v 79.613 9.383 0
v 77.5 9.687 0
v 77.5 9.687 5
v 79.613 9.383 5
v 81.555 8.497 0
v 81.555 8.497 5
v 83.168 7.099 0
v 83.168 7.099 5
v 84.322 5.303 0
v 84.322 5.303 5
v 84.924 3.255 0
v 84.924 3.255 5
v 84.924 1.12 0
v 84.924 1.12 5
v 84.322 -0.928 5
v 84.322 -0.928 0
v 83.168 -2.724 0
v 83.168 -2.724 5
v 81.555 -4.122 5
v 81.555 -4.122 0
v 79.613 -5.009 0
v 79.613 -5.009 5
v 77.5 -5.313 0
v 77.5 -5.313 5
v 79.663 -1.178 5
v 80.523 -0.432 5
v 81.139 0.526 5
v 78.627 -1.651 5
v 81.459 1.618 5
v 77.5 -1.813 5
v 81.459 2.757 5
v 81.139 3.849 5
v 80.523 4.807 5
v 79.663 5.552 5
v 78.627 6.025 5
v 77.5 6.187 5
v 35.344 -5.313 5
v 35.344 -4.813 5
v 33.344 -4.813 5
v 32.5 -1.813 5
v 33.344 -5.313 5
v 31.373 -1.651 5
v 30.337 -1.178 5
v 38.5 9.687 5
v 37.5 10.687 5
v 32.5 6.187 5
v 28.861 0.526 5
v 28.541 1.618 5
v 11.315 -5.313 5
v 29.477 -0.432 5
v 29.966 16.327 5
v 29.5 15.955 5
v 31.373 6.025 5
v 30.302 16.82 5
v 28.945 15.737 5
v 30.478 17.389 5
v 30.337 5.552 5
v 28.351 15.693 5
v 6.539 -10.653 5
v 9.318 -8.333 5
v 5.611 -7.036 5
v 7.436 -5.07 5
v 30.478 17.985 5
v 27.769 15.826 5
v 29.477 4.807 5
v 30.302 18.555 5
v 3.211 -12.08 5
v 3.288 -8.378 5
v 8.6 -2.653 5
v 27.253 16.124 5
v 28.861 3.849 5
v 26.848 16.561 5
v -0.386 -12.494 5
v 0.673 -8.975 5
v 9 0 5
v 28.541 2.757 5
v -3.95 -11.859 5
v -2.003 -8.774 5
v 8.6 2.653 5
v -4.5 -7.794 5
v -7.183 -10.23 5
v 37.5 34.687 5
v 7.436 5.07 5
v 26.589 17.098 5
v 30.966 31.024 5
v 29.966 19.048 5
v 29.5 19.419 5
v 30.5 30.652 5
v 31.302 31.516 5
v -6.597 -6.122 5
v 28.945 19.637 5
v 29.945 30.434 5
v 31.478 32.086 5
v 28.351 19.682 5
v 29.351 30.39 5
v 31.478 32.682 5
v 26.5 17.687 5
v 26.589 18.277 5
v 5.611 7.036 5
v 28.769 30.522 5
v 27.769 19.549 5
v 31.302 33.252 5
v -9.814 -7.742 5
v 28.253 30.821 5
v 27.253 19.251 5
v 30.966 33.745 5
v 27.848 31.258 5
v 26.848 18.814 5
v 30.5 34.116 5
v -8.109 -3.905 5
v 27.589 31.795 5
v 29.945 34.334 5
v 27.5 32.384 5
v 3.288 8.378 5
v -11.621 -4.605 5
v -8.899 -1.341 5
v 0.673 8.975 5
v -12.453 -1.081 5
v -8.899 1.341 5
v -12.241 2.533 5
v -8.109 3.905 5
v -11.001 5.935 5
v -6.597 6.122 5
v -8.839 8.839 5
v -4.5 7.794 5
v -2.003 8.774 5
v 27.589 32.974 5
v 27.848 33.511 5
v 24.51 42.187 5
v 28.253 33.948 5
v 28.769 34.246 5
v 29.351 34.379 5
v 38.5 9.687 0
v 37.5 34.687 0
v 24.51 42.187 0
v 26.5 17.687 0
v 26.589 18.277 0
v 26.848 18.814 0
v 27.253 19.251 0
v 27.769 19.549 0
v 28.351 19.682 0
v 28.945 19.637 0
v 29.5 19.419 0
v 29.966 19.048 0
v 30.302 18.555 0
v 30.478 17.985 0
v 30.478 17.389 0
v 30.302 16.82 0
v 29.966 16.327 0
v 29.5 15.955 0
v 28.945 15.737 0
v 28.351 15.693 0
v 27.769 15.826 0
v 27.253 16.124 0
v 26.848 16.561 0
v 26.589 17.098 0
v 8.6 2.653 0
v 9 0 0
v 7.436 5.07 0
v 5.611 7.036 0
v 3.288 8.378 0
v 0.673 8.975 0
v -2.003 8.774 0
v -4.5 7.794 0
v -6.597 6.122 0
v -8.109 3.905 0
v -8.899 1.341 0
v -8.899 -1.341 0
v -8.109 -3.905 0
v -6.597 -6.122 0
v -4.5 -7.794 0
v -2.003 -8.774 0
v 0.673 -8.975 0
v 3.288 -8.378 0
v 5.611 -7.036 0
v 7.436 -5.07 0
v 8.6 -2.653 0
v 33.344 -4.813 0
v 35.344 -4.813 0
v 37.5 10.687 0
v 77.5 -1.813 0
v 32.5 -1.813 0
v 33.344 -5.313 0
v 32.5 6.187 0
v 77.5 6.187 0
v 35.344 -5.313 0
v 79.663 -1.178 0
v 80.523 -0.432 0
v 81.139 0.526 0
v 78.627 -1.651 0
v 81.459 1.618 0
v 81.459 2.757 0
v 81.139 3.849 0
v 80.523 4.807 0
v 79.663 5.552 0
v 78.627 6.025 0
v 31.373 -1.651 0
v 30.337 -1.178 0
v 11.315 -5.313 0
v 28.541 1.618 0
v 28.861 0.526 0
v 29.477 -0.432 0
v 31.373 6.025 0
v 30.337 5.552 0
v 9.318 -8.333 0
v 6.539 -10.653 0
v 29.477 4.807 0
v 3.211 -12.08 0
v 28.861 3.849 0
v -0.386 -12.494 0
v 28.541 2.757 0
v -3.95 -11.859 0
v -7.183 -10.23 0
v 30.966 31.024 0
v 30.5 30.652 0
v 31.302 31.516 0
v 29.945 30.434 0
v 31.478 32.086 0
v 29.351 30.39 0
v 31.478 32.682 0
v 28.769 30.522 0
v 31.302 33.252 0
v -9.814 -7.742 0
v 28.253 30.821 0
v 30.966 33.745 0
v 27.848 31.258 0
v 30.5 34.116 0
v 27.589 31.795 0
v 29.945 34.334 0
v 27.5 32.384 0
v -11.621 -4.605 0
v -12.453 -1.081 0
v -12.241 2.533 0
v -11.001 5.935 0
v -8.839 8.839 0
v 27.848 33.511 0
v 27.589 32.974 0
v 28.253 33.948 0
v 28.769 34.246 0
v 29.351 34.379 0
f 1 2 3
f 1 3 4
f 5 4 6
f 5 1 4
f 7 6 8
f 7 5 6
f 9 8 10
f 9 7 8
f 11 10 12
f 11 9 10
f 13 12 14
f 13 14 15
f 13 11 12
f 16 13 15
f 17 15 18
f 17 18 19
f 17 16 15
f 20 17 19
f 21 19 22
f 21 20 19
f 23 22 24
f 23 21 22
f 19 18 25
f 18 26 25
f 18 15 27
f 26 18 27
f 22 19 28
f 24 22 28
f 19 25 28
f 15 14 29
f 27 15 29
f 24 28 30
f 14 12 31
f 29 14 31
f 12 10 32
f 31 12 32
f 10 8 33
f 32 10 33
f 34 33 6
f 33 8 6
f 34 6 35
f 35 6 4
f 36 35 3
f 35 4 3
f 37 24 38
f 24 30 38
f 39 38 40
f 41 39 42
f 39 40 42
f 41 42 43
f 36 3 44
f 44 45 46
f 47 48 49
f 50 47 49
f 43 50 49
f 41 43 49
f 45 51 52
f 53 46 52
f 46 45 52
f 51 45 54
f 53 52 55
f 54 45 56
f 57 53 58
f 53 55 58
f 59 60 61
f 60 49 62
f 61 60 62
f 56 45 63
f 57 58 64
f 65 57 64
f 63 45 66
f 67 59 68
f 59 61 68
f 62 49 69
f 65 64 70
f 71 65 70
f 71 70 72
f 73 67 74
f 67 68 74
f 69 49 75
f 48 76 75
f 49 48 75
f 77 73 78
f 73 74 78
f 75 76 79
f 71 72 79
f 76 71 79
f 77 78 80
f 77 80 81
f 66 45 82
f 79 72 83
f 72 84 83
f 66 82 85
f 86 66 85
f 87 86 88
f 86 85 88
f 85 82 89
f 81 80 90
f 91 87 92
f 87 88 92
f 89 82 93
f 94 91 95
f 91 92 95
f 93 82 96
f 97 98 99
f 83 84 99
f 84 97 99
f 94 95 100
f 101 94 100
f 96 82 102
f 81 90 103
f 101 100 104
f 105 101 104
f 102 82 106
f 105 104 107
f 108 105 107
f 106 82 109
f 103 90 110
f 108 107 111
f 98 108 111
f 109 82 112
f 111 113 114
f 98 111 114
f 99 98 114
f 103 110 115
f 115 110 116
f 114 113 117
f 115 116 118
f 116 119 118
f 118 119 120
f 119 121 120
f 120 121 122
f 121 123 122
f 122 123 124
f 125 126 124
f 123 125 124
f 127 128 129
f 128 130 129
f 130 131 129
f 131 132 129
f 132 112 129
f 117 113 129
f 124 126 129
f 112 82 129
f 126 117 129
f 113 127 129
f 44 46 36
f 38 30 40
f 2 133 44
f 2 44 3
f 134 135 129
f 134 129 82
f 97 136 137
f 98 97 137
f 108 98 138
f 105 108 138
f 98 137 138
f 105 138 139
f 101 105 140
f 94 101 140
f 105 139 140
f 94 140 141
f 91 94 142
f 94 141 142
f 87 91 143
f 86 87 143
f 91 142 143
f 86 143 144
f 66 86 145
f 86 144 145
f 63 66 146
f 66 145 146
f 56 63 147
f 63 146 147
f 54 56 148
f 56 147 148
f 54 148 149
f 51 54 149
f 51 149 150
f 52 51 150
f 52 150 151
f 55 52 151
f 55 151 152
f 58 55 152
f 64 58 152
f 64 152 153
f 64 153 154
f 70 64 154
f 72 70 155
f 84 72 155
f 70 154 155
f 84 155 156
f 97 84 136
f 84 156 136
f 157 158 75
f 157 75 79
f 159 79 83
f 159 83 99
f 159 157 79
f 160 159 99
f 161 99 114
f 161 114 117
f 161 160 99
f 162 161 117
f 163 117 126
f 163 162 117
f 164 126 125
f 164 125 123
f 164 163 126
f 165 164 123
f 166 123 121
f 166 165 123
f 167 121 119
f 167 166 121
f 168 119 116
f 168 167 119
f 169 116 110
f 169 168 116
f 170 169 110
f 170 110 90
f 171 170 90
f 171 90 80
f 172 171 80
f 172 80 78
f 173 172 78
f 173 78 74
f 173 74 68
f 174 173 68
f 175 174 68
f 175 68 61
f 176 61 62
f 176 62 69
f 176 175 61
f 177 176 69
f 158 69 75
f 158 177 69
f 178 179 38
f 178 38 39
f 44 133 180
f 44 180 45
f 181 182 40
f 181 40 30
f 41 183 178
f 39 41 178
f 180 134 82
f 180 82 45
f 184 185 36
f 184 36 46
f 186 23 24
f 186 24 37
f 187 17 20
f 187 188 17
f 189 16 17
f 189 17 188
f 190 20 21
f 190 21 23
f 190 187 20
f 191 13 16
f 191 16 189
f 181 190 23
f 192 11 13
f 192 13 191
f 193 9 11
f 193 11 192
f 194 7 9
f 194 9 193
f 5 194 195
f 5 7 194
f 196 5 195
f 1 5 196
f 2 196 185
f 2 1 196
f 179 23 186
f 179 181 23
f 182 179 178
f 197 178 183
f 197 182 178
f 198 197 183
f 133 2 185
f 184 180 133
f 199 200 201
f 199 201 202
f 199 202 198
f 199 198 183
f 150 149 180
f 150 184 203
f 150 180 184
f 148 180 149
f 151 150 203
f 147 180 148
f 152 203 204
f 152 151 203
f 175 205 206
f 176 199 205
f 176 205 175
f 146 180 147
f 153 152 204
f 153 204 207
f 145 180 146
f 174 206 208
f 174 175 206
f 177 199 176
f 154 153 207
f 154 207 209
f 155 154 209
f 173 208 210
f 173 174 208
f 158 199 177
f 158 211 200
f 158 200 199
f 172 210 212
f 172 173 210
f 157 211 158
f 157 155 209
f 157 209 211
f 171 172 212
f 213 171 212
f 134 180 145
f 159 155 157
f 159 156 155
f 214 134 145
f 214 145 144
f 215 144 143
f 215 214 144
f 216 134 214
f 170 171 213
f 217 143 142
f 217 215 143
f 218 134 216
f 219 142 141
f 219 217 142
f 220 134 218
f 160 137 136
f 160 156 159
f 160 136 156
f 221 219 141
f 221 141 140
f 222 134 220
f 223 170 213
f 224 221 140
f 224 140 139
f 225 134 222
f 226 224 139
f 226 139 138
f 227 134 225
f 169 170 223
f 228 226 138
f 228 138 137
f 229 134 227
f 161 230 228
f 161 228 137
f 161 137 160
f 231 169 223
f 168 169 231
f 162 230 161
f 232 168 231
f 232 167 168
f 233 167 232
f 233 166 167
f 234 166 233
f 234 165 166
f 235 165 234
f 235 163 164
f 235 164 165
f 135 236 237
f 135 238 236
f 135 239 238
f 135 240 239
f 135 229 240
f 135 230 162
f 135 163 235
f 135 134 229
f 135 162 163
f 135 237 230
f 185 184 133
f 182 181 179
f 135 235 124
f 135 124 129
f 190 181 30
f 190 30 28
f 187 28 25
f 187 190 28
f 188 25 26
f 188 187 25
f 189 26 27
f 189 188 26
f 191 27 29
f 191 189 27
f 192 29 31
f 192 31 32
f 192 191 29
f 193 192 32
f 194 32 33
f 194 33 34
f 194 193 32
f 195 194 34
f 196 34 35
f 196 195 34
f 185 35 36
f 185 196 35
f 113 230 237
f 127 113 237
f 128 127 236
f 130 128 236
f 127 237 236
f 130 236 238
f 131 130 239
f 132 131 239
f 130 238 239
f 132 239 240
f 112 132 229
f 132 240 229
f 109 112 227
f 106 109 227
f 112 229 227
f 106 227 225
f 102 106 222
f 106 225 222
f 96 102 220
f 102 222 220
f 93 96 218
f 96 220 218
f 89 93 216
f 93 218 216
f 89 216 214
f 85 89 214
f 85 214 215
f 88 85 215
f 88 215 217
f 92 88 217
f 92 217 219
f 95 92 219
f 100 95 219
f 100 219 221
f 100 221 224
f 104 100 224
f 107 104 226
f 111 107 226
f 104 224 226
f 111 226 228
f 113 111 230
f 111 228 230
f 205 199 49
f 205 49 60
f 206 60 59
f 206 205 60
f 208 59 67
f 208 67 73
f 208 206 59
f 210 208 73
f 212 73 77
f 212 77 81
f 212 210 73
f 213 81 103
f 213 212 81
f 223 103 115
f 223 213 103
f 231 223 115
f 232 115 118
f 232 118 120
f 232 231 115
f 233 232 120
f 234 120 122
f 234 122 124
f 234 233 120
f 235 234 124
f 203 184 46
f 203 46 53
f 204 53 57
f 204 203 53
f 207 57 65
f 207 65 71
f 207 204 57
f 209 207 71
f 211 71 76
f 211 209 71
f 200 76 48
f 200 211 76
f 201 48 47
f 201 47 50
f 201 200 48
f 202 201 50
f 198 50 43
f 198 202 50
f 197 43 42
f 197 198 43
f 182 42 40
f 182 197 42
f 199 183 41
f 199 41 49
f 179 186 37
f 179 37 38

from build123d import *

# Parameters (mm, degrees)
SKETCH_1_R          = 9
EXTRUDE_1_DEPTH     = 5
SKETCH_2_R          = 2
CUT_EXTRUDE_1_DEPTH = 5
CHAMFER_1_SIZE      = 1
SKETCH_3_W          = 2
SKETCH_3_H          = 0.5
CUT_EXTRUDE_2_DEPTH = 7


with BuildPart() as part:
    # 草图1 → 凸台-拉伸1 (new body)
    with BuildSketch(Plane.XY):
        with BuildLine():
            Line((37.5, 34.687288473), (37.5, 9.687288473))
            Line((37.5, 9.687288473), (77.5, 9.687288473))
            ThreePointArc((77.5, 9.687288473), (85, 2.187288473), (77.5, -5.312711527))
            Line((77.5, -5.312711527), (11.314817552, -5.312711527))
            ThreePointArc((11.314817552, -5.312711527), (-7.183257499, -10.229897932), (-8.838834765, 8.838834765))
            Line((-8.838834765, 8.838834765), (24.509618943, 42.187288473))
            Line((24.509618943, 42.187288473), (37.5, 34.687288473))
        make_face()
        Circle(SKETCH_1_R, mode=Mode.SUBTRACT)
        with BuildLine():
            Line((77.5, 6.187288473), (32.499999279, 6.187288473))
            ThreePointArc((32.499999279, 6.187288473), (28.5, 2.187288113), (32.5, -1.812711527))
            Line((32.5, -1.812711527), (77.5, -1.812711527))
            ThreePointArc((77.5, -1.812711527), (81.5, 2.187288473), (77.5, 6.187288473))
        make_face(mode=Mode.SUBTRACT)
    extrude(amount=EXTRUDE_1_DEPTH)

    # 草图2 → 切除-拉伸1 (cut)
    with BuildSketch(Plane(origin=(0, 0, 0), x_dir=(-1, 0, 0), z_dir=(0, 0, -1))):
        with Locations((-28.5, 17.687288473)):
            Circle(SKETCH_2_R)
        with Locations((-29.5, 32.38422693)):
            Circle(SKETCH_2_R)
    extrude(amount=-CUT_EXTRUDE_1_DEPTH, mode=Mode.SUBTRACT)

    # 倒角1
    chamfer_1_edges = [part.edges().sort_by_distance(p)[0] for p in [
        (37.5, 9.687288473, 2.5),
    ]]
    chamfer(chamfer_1_edges, length=CHAMFER_1_SIZE)

    # 草图3 → 切除-拉伸2 (cut)
    with BuildSketch(Plane(origin=(0, 0, 0), x_dir=(-1, 0, 0), z_dir=(0, 0, -1))):
        with Locations((-34.343585868, -5.062711527)):
            Rectangle(SKETCH_3_W, SKETCH_3_H)
    extrude(amount=-CUT_EXTRUDE_2_DEPTH, mode=Mode.SUBTRACT)


solid = part.part
